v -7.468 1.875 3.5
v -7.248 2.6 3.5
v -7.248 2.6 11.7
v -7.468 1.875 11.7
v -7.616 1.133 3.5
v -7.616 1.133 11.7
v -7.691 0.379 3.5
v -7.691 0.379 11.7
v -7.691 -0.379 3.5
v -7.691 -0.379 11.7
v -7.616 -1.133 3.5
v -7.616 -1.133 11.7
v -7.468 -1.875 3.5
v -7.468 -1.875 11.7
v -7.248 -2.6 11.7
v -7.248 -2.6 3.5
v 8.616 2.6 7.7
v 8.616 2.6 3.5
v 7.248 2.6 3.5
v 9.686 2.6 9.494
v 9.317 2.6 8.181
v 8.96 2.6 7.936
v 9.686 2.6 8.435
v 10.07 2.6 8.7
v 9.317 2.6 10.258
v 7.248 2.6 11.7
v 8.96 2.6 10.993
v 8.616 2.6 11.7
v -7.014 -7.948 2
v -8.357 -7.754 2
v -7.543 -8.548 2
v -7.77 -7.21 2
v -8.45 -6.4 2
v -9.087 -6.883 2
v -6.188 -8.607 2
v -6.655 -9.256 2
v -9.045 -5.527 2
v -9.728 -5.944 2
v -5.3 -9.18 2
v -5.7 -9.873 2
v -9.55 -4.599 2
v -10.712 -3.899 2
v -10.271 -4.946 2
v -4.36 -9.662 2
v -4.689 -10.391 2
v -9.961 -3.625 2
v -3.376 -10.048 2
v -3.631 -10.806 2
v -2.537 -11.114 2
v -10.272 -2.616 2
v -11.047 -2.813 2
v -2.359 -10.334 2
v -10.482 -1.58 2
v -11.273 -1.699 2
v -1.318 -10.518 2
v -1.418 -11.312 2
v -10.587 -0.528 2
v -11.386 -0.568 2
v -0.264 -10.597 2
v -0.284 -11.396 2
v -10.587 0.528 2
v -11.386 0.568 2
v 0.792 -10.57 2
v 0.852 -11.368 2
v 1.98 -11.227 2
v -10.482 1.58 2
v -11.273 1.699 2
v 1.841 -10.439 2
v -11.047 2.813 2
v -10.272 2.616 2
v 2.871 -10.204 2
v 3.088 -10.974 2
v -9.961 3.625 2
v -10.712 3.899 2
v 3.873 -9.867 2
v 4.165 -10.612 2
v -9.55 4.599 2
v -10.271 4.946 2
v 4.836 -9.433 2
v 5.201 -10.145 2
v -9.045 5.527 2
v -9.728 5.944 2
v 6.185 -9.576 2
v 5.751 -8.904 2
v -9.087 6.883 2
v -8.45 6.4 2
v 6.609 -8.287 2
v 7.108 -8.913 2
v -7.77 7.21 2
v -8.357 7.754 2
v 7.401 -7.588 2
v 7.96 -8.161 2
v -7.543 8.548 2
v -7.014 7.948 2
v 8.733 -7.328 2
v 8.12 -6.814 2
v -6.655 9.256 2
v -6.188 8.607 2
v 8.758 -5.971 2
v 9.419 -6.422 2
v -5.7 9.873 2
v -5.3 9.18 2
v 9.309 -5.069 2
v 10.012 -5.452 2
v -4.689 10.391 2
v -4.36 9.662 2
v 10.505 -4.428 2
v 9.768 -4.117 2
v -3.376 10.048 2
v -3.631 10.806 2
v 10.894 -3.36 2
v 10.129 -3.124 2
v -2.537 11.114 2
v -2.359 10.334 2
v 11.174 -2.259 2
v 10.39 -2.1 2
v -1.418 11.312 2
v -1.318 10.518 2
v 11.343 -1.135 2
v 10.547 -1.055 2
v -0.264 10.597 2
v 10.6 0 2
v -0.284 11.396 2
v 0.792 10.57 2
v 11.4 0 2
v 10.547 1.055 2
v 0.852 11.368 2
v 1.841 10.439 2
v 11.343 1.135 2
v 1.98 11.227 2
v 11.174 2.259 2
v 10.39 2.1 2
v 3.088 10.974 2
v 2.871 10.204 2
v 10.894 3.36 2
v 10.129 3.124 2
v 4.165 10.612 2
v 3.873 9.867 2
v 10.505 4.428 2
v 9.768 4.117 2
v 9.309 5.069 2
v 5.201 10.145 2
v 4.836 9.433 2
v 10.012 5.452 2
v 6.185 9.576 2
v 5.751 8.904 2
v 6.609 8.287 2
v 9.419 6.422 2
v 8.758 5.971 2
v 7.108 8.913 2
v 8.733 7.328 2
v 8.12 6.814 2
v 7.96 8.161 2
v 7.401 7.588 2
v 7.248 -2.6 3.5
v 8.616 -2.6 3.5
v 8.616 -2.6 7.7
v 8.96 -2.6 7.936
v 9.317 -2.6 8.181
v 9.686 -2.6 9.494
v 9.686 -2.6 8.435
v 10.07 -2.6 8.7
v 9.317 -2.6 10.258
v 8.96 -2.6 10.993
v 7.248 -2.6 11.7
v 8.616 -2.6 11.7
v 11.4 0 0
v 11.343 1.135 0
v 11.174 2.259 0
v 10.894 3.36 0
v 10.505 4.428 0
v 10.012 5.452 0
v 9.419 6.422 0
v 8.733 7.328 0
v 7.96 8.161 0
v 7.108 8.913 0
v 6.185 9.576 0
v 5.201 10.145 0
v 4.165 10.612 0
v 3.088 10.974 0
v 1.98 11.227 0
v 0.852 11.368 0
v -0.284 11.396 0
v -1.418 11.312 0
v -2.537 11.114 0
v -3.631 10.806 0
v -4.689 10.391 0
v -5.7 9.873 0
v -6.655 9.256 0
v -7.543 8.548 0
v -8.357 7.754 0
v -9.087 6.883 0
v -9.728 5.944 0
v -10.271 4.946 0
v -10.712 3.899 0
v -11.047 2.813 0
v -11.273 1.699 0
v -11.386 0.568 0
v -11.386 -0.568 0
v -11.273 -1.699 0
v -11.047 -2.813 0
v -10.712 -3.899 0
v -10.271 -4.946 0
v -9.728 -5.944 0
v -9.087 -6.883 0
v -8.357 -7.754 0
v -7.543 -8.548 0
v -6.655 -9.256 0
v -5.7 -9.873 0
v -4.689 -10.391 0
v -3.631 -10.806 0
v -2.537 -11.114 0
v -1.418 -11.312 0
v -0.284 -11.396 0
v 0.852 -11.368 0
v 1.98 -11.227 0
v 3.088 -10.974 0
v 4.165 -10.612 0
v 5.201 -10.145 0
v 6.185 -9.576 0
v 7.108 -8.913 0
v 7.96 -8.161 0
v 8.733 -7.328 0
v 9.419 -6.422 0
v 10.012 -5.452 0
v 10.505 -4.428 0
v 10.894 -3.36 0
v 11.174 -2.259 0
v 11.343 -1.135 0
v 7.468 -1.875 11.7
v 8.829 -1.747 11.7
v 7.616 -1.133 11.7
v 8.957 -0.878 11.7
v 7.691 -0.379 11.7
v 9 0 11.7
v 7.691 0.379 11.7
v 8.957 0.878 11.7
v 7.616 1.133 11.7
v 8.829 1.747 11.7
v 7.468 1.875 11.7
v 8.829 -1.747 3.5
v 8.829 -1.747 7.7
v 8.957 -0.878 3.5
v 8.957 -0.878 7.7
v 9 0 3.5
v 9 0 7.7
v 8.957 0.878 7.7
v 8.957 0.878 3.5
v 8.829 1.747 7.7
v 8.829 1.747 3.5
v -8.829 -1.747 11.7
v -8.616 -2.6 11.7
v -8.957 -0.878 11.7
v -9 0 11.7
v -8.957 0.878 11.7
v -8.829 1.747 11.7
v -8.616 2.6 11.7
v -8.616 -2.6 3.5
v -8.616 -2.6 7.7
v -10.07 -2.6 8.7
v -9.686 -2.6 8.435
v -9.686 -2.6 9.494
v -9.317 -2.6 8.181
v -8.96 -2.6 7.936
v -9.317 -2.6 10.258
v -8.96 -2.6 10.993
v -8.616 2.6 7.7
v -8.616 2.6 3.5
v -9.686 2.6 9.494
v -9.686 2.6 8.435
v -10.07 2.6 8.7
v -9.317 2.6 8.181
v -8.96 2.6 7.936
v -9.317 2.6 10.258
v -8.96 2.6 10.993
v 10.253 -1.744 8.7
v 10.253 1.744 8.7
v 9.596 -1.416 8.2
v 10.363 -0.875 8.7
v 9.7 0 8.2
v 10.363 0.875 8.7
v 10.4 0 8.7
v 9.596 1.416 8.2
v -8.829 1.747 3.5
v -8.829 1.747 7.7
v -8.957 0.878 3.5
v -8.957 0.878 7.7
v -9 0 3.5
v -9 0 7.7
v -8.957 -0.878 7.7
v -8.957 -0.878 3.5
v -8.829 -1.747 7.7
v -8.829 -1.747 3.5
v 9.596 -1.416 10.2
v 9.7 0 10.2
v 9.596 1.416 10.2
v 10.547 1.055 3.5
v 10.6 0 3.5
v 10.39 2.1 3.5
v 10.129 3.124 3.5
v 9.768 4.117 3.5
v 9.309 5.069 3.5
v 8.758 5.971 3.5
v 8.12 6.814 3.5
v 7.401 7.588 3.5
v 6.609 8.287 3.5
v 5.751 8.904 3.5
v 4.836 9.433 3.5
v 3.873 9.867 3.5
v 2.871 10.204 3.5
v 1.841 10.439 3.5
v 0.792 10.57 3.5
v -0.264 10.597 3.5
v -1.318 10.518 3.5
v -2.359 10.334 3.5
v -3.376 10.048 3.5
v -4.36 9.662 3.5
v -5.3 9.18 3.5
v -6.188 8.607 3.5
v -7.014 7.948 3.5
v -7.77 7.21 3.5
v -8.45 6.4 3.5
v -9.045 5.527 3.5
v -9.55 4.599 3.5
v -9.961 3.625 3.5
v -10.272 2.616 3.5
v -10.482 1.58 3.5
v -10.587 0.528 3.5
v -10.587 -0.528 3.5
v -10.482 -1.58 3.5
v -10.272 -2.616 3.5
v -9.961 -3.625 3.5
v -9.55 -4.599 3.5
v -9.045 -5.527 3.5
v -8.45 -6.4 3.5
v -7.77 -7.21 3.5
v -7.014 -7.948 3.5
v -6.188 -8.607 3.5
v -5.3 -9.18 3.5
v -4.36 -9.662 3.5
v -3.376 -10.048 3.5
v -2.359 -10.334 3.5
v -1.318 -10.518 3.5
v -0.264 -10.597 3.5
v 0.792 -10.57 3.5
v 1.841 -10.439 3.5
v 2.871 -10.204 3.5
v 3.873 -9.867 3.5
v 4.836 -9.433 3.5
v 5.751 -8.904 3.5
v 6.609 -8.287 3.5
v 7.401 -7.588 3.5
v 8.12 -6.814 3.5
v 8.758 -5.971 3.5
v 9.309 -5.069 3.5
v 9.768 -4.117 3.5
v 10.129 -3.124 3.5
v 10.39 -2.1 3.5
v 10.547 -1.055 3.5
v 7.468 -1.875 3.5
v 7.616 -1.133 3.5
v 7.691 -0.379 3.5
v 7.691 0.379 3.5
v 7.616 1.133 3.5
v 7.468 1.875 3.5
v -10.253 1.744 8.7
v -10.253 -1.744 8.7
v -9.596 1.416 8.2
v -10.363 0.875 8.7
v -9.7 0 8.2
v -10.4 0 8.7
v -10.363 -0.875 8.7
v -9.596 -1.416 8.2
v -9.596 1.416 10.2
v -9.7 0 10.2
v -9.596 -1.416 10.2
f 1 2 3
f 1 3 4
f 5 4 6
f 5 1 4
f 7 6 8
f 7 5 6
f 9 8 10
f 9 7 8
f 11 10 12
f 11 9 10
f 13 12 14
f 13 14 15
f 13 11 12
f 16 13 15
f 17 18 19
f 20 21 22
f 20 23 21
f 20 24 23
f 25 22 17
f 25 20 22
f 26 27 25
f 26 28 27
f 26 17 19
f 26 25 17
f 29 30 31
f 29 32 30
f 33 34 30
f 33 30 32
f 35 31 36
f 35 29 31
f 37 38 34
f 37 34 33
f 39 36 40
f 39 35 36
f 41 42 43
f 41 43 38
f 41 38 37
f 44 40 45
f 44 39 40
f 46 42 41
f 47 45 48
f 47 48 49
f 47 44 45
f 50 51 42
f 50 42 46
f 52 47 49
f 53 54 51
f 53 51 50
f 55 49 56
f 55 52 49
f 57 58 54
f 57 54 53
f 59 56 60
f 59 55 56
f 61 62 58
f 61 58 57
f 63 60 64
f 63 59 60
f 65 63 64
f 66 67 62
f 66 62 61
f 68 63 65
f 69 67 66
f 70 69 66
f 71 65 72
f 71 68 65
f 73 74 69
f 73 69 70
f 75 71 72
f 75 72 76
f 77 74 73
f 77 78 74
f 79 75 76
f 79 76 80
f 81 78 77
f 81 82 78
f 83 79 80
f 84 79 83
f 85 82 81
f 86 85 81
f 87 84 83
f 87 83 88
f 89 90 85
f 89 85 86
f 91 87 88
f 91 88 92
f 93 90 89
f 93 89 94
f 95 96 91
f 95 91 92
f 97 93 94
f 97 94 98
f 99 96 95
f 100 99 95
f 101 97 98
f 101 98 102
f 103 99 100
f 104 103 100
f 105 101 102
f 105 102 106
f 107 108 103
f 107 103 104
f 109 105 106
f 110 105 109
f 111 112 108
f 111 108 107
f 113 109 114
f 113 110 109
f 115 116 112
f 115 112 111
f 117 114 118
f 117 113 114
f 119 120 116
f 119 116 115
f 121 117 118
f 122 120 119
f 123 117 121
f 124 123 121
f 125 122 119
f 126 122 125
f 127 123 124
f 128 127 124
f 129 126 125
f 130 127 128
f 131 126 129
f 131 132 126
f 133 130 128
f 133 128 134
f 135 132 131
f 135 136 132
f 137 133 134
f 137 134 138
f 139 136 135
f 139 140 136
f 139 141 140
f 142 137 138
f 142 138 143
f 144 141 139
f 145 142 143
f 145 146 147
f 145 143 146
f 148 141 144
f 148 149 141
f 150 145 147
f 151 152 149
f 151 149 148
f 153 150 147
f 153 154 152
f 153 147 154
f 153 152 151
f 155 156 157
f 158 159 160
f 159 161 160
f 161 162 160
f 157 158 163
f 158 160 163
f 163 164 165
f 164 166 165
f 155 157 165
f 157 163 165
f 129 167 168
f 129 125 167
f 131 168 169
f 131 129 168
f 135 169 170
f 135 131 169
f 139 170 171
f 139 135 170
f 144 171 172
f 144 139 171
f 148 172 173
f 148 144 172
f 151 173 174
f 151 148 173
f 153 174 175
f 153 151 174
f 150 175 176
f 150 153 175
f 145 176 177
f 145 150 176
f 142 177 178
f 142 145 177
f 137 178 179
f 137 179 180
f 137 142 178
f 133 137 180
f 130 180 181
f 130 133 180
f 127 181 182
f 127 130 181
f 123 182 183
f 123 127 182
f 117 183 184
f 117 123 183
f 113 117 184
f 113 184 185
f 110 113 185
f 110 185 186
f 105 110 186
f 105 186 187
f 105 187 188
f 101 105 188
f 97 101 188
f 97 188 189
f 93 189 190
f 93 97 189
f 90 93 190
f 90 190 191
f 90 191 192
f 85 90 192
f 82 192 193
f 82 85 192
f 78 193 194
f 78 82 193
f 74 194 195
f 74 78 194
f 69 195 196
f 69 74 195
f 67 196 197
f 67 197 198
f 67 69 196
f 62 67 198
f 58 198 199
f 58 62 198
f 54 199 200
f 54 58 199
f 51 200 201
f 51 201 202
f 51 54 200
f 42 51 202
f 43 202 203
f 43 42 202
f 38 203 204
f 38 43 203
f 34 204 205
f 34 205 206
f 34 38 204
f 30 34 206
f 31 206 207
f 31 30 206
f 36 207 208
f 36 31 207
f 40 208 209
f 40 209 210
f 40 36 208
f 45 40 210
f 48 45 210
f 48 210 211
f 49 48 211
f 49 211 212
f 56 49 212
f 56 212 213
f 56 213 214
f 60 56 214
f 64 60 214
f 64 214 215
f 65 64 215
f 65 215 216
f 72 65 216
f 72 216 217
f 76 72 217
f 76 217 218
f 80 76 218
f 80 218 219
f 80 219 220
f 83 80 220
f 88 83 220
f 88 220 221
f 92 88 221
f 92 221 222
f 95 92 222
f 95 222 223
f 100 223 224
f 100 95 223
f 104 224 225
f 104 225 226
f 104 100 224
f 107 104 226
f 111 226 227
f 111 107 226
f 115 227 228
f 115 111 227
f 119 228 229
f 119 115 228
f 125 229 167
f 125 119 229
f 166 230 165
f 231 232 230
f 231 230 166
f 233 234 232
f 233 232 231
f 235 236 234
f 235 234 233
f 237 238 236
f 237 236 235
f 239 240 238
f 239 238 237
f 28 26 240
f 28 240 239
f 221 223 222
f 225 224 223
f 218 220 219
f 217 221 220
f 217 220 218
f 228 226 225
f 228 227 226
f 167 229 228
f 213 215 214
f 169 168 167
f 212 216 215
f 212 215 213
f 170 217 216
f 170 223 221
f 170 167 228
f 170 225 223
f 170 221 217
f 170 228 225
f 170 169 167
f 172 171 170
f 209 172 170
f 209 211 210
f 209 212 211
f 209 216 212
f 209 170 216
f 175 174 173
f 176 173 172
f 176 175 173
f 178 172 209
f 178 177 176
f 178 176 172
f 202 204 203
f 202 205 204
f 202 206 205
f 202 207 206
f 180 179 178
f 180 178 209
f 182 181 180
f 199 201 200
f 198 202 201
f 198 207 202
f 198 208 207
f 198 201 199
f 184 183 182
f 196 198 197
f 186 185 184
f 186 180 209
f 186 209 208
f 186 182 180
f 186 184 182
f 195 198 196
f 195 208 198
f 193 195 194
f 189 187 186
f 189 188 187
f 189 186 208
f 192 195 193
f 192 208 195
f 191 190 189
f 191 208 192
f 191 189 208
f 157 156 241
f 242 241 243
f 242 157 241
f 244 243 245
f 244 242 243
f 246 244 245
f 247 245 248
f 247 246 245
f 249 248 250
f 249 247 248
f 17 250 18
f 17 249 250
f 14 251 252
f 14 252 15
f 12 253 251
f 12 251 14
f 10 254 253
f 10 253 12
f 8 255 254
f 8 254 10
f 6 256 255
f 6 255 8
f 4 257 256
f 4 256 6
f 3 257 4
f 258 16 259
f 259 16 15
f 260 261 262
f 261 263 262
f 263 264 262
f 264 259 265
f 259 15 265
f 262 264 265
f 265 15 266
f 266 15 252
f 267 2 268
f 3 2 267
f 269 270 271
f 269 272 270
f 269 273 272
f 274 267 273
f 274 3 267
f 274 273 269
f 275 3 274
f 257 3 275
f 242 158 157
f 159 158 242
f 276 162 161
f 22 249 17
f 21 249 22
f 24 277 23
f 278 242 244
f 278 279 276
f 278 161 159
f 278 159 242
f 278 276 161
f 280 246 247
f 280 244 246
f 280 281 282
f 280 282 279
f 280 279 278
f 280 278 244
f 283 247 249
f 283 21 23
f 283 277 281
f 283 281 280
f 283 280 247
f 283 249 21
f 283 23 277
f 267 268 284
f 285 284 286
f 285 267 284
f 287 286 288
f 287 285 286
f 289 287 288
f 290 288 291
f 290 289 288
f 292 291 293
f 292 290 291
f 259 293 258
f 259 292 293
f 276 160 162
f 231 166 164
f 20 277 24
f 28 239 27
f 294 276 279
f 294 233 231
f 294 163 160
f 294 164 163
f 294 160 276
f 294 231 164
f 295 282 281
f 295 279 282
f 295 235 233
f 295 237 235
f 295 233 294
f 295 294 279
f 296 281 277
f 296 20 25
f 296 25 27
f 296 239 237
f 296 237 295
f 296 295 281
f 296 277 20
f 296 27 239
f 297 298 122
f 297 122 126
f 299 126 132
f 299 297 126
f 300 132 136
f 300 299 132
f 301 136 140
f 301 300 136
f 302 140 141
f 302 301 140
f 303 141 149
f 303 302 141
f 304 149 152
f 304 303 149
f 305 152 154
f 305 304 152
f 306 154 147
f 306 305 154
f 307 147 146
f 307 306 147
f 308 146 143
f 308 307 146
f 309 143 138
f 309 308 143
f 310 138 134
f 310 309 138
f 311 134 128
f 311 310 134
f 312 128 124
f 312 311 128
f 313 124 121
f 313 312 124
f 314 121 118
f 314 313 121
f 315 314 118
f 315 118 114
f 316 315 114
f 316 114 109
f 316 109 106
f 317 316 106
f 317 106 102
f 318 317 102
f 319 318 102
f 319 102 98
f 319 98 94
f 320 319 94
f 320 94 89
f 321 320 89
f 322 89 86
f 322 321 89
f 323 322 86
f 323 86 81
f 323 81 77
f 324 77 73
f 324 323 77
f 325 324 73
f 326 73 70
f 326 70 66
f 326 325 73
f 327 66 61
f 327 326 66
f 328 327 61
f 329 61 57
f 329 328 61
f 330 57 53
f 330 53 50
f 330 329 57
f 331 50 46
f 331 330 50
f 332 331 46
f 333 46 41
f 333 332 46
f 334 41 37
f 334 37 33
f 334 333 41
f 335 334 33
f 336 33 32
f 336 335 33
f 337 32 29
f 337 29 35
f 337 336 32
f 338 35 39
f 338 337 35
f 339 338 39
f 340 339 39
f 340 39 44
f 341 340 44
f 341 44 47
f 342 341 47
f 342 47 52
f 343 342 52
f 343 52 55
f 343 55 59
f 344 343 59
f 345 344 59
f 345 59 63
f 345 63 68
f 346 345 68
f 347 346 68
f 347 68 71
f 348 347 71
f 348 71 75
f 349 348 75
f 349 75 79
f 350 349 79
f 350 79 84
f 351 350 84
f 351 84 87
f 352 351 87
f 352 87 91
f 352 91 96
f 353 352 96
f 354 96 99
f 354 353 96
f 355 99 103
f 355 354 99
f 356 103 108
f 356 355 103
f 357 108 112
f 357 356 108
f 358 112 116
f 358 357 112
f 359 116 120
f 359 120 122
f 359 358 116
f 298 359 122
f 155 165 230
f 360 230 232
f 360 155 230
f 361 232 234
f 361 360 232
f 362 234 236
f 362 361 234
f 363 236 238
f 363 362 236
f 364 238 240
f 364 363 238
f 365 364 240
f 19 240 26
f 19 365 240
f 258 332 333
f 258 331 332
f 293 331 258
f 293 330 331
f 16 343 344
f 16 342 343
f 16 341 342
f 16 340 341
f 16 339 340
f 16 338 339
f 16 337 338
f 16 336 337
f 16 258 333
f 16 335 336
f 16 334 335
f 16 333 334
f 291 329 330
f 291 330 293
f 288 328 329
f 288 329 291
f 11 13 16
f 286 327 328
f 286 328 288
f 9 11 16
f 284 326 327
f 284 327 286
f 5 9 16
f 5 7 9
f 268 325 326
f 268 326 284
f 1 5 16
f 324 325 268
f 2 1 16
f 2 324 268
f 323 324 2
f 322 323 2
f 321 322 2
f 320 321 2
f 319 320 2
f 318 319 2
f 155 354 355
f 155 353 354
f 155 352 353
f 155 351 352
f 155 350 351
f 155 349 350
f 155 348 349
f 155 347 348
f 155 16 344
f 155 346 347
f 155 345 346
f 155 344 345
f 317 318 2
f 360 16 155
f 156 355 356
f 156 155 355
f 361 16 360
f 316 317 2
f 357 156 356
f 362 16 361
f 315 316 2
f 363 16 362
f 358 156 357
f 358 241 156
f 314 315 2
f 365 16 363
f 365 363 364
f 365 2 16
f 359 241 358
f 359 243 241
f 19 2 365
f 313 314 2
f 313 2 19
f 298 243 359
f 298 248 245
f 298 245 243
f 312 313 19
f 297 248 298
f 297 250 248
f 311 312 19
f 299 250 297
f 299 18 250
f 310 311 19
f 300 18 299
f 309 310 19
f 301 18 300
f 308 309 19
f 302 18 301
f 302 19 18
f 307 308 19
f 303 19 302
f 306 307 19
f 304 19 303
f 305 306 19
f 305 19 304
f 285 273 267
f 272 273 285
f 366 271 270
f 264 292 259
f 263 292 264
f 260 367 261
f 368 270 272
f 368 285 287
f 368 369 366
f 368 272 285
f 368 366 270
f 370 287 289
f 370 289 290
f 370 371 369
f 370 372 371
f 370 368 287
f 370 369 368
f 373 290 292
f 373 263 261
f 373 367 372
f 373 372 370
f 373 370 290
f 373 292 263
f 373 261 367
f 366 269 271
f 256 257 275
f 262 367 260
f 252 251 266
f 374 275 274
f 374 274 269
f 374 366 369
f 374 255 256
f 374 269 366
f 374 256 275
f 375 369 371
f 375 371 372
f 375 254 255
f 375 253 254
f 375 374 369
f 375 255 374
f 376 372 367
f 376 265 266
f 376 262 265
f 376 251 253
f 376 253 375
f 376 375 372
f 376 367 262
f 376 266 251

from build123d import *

# Parameters (mm, degrees)
SKETCH001_W   = 28.911368
SKETCH001_H   = 11.888076
SKETCH001_W_2 = 28.673414
SKETCH001_H_2 = 9.741194
POCKET_DEPTH  = 8.2


with BuildPart() as part:
    # Sketch → Revolution (revolve)
    with BuildSketch(Plane.XZ):
        Polygon((0, 0), (11.4, 0), (11.4, 2), (10.6, 2), (10.6, 3.5), (9, 3.5), (9, 7.7), (10.4, 8.7), (9, 11.7), (7.7, 11.7), (7.7, 3.5), (0, 3.5), align=None)
    revolve(axis=Axis((0, 0, 0), (0, 0, 1)))

    # Sketch001 (on Face9 of Revolution) → Pocket (cut)
    with BuildSketch(Plane(origin=(0, 0, 11.7), x_dir=(-1, 0, 0), z_dir=(0, 0, 1))):
        with Locations((-0.075645, 8.544038)):
            Rectangle(SKETCH001_W, SKETCH001_H)
        with Locations((0.162309, -7.470597)):
            Rectangle(SKETCH001_W_2, SKETCH001_H_2)
    extrude(amount=-POCKET_DEPTH, mode=Mode.SUBTRACT)


solid = part.part
